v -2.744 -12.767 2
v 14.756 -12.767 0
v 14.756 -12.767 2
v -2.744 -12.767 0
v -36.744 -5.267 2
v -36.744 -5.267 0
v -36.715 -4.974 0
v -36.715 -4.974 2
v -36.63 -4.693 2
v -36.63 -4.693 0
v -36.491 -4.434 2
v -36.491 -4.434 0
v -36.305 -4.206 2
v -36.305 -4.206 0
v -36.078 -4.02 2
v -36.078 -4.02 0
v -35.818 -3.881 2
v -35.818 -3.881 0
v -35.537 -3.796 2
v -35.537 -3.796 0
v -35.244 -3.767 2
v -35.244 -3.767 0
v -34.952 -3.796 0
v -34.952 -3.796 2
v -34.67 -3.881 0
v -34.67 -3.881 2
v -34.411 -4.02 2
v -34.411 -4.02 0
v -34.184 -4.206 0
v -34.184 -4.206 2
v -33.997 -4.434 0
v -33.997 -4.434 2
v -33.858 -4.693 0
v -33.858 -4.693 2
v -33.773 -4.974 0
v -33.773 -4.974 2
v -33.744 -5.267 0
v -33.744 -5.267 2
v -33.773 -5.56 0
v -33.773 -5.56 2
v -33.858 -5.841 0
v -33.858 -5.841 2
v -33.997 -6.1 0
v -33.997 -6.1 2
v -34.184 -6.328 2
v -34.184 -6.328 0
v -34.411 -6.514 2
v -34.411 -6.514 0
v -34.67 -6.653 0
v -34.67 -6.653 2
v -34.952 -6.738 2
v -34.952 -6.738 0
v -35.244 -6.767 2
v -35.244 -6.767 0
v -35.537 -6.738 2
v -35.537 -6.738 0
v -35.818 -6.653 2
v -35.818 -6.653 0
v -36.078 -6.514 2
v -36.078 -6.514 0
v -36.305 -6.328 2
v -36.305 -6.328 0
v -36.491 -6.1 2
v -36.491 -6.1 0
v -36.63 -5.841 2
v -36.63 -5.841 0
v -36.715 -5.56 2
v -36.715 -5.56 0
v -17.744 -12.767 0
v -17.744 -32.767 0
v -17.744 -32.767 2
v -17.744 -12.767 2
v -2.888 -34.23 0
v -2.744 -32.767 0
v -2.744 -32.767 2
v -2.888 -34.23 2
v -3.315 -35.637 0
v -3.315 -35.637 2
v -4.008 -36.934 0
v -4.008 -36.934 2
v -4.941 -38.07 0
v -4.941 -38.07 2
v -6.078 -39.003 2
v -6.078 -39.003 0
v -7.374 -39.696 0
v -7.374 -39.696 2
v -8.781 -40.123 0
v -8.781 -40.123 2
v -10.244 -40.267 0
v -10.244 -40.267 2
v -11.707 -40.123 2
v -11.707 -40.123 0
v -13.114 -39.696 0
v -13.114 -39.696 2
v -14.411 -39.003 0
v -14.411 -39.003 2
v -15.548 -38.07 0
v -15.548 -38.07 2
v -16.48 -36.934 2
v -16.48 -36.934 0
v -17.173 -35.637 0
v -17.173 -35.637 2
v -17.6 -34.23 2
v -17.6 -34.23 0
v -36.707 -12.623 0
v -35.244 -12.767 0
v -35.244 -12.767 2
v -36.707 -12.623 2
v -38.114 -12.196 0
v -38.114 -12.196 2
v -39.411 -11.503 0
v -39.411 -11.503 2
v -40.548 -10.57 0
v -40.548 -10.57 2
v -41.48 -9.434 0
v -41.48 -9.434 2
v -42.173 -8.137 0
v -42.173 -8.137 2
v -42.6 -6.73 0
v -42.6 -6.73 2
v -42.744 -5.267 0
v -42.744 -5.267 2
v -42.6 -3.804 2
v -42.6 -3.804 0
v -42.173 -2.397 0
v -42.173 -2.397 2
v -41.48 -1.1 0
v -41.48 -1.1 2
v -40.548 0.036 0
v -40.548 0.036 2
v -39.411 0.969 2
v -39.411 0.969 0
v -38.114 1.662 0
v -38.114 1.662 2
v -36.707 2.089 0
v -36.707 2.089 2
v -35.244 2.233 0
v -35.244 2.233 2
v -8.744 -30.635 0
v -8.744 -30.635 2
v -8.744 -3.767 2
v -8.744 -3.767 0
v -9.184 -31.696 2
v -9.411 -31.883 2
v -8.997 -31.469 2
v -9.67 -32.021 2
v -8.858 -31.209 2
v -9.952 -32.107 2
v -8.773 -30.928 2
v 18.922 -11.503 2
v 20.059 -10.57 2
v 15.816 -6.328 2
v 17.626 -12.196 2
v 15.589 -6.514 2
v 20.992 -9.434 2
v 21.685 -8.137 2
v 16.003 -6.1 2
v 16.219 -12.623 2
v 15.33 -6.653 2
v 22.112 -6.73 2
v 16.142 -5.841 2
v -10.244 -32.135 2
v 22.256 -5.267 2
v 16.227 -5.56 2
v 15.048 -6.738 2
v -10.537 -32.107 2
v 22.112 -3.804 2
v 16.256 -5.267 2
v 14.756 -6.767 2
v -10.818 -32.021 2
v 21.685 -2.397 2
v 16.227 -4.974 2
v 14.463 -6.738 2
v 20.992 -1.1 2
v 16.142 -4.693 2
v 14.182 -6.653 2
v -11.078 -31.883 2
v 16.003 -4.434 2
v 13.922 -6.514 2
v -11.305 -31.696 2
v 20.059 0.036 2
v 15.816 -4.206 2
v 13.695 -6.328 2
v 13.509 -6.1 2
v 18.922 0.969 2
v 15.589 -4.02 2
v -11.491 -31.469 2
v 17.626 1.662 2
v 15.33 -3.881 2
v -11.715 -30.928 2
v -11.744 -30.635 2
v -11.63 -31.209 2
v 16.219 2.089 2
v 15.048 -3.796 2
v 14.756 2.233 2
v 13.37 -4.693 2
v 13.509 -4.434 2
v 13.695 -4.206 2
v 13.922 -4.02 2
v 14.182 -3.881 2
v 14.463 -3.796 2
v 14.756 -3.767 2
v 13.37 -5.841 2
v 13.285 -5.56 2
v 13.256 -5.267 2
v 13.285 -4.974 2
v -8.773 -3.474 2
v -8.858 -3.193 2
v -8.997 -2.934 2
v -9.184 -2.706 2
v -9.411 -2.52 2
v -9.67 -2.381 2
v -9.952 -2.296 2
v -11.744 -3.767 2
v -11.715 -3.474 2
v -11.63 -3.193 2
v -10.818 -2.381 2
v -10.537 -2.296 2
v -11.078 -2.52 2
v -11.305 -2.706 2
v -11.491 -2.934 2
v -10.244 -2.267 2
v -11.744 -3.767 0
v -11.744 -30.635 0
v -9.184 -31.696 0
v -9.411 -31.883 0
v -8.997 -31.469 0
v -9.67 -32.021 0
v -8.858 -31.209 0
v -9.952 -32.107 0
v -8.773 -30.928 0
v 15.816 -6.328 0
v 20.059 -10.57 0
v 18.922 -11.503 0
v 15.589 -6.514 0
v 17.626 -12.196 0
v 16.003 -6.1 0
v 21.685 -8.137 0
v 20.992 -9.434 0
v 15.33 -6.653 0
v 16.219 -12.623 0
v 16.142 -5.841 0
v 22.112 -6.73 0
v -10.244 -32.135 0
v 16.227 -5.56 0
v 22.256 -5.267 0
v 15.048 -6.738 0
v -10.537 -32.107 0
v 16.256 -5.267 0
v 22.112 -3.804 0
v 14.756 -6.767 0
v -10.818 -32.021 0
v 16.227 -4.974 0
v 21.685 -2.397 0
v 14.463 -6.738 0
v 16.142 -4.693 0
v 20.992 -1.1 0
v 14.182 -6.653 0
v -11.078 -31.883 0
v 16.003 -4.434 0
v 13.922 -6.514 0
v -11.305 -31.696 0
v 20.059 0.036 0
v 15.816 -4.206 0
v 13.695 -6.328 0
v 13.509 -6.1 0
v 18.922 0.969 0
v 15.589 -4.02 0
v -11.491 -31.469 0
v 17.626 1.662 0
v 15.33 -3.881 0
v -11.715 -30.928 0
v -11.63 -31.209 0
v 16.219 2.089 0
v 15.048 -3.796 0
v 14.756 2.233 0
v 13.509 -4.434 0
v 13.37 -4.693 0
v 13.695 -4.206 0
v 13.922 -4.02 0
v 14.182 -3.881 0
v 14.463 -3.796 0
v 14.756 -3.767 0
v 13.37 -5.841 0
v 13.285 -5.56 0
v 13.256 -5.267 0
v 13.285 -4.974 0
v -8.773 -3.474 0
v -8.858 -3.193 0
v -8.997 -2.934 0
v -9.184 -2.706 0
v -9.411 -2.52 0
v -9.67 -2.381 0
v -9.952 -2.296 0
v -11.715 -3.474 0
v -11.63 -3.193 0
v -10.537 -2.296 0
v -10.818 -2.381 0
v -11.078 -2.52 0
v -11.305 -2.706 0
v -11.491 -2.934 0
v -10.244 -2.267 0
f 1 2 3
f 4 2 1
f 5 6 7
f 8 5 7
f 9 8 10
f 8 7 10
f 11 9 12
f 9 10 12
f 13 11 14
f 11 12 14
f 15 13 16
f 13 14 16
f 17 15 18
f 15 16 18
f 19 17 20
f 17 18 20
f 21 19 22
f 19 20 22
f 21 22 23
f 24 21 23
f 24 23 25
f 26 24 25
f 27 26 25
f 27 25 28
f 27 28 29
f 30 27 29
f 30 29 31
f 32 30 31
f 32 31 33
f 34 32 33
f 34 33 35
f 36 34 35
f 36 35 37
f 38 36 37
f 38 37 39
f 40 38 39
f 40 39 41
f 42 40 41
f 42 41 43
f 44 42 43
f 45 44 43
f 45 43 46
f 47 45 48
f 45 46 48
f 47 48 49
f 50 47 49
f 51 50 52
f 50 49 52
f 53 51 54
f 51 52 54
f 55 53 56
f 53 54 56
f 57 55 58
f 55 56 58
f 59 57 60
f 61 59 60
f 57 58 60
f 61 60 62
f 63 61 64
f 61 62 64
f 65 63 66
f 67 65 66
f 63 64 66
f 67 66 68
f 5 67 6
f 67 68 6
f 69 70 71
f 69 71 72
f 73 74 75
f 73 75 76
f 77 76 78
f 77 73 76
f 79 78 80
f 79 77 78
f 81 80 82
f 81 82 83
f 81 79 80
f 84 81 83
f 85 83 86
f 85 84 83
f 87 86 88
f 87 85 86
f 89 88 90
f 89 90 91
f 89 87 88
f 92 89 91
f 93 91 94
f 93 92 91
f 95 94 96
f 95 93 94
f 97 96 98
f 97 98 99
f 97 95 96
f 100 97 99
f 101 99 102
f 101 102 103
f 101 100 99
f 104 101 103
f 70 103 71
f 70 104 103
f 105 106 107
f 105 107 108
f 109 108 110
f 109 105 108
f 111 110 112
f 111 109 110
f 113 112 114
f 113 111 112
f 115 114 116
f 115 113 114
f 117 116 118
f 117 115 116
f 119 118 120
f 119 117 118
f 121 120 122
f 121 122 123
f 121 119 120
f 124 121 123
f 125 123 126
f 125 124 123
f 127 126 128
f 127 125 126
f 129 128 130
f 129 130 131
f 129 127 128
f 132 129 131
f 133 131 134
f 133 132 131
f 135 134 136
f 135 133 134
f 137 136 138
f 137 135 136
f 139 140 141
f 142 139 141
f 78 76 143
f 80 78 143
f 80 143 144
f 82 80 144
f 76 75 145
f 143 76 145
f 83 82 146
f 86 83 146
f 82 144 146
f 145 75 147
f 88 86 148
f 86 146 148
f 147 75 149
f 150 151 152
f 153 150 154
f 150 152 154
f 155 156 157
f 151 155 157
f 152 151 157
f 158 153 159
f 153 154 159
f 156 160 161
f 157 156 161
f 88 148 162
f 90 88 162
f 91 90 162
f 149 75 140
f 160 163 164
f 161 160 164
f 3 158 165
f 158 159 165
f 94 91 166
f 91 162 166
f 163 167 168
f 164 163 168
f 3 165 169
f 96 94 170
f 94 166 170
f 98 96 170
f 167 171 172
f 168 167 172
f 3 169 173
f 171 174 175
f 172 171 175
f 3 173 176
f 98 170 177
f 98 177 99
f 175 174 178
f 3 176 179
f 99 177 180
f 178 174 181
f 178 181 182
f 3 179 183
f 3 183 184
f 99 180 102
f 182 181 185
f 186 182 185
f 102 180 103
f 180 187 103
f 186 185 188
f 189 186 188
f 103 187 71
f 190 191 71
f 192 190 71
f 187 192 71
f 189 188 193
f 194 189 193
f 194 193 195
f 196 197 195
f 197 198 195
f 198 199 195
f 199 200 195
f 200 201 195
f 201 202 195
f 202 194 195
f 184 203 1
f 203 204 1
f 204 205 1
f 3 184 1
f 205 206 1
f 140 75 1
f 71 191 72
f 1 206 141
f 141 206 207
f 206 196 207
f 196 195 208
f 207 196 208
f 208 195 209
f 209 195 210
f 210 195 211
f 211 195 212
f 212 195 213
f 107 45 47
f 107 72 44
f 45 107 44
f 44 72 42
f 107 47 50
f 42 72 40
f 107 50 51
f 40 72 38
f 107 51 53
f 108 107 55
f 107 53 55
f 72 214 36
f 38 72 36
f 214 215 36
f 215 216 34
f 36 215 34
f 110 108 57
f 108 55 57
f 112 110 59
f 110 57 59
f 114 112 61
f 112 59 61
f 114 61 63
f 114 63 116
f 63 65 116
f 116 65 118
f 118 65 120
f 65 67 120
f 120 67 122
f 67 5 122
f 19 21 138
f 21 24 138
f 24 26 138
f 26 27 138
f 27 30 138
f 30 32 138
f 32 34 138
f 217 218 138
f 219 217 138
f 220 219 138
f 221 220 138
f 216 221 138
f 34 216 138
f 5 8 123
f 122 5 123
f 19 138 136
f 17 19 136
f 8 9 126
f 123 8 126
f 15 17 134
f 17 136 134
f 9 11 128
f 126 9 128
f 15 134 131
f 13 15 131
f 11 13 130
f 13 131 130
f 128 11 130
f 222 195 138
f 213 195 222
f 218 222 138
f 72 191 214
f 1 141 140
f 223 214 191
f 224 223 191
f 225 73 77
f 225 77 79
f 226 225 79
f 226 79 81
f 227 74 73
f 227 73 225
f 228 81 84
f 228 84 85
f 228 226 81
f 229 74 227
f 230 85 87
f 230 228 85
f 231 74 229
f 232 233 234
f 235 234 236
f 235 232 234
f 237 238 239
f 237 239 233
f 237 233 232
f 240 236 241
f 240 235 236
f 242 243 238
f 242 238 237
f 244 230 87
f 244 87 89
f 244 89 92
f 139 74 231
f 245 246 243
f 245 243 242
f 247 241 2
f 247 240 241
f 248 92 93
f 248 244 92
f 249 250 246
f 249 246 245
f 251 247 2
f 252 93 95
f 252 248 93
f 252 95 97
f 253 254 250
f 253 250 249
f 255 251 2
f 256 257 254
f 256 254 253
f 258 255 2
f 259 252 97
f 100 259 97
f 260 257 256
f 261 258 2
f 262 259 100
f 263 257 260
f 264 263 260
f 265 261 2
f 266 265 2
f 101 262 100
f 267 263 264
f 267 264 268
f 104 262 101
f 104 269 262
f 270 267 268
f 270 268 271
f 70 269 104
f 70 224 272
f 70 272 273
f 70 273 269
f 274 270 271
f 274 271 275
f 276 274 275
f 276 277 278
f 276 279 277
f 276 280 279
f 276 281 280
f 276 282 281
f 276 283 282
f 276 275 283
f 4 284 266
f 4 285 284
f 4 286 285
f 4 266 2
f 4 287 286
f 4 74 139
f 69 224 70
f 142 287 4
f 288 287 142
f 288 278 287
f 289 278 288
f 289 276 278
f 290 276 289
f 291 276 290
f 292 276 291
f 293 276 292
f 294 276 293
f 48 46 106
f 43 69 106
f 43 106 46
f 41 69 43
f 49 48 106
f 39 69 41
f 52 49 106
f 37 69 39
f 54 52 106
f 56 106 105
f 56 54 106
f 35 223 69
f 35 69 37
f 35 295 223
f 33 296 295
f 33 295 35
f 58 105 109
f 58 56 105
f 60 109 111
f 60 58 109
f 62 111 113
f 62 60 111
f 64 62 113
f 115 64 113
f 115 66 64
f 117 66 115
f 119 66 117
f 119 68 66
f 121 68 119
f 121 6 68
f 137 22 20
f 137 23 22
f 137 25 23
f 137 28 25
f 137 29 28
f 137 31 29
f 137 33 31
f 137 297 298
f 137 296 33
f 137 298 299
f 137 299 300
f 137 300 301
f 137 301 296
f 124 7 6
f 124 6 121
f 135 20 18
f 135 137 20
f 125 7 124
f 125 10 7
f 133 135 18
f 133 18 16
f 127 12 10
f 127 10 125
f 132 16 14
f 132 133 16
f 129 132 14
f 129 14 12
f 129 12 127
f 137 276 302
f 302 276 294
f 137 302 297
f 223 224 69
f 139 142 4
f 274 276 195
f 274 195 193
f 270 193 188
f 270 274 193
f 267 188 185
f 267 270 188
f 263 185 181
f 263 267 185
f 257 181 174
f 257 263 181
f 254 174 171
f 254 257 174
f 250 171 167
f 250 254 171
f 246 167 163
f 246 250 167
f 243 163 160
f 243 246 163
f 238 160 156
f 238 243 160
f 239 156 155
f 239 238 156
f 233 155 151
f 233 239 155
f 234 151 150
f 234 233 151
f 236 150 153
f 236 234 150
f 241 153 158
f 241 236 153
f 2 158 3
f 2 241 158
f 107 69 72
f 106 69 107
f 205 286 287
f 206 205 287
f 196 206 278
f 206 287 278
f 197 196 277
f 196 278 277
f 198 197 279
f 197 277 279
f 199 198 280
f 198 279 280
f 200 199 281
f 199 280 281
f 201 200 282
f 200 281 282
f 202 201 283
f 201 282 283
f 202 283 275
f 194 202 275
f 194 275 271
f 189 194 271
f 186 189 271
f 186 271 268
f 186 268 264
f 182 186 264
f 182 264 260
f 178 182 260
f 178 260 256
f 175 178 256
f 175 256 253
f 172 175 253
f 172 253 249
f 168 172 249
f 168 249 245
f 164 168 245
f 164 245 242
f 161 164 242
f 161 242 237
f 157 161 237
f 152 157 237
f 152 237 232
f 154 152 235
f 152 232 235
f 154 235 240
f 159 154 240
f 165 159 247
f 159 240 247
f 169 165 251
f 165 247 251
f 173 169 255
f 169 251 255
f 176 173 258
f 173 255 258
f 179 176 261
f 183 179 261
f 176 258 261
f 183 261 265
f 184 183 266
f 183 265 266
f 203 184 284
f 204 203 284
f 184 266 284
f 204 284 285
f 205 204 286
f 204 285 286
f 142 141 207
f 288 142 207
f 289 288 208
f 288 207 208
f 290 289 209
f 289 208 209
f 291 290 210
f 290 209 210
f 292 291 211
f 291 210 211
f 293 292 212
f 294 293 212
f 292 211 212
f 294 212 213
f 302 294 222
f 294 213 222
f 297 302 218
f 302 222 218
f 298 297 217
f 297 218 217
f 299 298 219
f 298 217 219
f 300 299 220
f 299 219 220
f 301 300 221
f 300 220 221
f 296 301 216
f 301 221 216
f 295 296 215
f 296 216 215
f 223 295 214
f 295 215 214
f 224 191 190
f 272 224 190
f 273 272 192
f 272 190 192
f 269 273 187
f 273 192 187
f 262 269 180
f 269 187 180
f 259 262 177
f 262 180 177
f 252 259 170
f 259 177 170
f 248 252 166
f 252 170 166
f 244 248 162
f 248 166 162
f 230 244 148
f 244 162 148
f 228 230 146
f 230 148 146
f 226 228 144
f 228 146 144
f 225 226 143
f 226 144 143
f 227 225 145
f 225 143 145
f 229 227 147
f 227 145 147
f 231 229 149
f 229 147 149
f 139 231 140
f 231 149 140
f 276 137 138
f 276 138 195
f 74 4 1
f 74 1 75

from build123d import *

# Parameters (mm, degrees)
EXTRUDE_1_DEPTH     = 2
CUT_EXTRUDE_2_DEPTH = 59.758033272
SKETCH_3_R          = 1.5
CUT_EXTRUDE_1_DEPTH = 59.758033272


with BuildPart() as part:
    # 草图1 → 凸台-拉伸1 (new body)
    with BuildSketch(Plane.XY):
        with BuildLine():
            Line((-35.244286067, 2.232984072), (14.755713933, 2.232984072))
            ThreePointArc((14.755713933, 2.232984072), (22.255713134, -5.267016727), (14.755712334, -12.767015928))
            Line((14.755712334, -12.767015928), (-2.744287666, -12.767015928))
            Line((-2.744287666, -12.767015928), (-2.744287666, -32.767015928))
            ThreePointArc((-2.744287666, -32.767015928), (-10.244286561, -40.267014822), (-17.744285455, -32.767015928))
            Line((-17.744285455, -32.767015928), (-17.744285455, -12.767015928))
            Line((-17.744285455, -12.767015928), (-35.244285455, -12.767015928))
            ThreePointArc((-35.244285455, -12.767015928), (-42.744286067, -5.267016233), (-35.244286067, 2.232984072))
        make_face()
    extrude(amount=EXTRUDE_1_DEPTH)

    # 草图2 → 切除-拉伸2 (cut, through all)
    with BuildSketch(Plane.XY.offset(2)):
        with BuildLine():
            Line((-11.744285455, -3.767015928), (-11.744285455, -30.635435278))
            ThreePointArc((-11.744285455, -30.635435278), (-10.244286561, -32.135434173), (-8.744287666, -30.635435278))
            Line((-8.744287666, -30.635435278), (-8.744287666, -3.767015928))
            ThreePointArc((-8.744287666, -3.767015928), (-10.244286561, -2.267017033), (-11.744285455, -3.767015928))
        make_face()
    extrude(amount=-CUT_EXTRUDE_2_DEPTH, mode=Mode.SUBTRACT)

    # 草图3 → 切除-拉伸1 (cut, through all)
    with BuildSketch(Plane(origin=(0, 0, 0), x_dir=(-1, 0, 0), z_dir=(0, 0, -1))):
        with Locations((-14.755712334, -5.267015928)):
            Circle(SKETCH_3_R)
        with Locations((35.244285455, -5.267015928)):
            Circle(SKETCH_3_R)
    extrude(amount=-CUT_EXTRUDE_1_DEPTH, mode=Mode.SUBTRACT)


solid = part.part
